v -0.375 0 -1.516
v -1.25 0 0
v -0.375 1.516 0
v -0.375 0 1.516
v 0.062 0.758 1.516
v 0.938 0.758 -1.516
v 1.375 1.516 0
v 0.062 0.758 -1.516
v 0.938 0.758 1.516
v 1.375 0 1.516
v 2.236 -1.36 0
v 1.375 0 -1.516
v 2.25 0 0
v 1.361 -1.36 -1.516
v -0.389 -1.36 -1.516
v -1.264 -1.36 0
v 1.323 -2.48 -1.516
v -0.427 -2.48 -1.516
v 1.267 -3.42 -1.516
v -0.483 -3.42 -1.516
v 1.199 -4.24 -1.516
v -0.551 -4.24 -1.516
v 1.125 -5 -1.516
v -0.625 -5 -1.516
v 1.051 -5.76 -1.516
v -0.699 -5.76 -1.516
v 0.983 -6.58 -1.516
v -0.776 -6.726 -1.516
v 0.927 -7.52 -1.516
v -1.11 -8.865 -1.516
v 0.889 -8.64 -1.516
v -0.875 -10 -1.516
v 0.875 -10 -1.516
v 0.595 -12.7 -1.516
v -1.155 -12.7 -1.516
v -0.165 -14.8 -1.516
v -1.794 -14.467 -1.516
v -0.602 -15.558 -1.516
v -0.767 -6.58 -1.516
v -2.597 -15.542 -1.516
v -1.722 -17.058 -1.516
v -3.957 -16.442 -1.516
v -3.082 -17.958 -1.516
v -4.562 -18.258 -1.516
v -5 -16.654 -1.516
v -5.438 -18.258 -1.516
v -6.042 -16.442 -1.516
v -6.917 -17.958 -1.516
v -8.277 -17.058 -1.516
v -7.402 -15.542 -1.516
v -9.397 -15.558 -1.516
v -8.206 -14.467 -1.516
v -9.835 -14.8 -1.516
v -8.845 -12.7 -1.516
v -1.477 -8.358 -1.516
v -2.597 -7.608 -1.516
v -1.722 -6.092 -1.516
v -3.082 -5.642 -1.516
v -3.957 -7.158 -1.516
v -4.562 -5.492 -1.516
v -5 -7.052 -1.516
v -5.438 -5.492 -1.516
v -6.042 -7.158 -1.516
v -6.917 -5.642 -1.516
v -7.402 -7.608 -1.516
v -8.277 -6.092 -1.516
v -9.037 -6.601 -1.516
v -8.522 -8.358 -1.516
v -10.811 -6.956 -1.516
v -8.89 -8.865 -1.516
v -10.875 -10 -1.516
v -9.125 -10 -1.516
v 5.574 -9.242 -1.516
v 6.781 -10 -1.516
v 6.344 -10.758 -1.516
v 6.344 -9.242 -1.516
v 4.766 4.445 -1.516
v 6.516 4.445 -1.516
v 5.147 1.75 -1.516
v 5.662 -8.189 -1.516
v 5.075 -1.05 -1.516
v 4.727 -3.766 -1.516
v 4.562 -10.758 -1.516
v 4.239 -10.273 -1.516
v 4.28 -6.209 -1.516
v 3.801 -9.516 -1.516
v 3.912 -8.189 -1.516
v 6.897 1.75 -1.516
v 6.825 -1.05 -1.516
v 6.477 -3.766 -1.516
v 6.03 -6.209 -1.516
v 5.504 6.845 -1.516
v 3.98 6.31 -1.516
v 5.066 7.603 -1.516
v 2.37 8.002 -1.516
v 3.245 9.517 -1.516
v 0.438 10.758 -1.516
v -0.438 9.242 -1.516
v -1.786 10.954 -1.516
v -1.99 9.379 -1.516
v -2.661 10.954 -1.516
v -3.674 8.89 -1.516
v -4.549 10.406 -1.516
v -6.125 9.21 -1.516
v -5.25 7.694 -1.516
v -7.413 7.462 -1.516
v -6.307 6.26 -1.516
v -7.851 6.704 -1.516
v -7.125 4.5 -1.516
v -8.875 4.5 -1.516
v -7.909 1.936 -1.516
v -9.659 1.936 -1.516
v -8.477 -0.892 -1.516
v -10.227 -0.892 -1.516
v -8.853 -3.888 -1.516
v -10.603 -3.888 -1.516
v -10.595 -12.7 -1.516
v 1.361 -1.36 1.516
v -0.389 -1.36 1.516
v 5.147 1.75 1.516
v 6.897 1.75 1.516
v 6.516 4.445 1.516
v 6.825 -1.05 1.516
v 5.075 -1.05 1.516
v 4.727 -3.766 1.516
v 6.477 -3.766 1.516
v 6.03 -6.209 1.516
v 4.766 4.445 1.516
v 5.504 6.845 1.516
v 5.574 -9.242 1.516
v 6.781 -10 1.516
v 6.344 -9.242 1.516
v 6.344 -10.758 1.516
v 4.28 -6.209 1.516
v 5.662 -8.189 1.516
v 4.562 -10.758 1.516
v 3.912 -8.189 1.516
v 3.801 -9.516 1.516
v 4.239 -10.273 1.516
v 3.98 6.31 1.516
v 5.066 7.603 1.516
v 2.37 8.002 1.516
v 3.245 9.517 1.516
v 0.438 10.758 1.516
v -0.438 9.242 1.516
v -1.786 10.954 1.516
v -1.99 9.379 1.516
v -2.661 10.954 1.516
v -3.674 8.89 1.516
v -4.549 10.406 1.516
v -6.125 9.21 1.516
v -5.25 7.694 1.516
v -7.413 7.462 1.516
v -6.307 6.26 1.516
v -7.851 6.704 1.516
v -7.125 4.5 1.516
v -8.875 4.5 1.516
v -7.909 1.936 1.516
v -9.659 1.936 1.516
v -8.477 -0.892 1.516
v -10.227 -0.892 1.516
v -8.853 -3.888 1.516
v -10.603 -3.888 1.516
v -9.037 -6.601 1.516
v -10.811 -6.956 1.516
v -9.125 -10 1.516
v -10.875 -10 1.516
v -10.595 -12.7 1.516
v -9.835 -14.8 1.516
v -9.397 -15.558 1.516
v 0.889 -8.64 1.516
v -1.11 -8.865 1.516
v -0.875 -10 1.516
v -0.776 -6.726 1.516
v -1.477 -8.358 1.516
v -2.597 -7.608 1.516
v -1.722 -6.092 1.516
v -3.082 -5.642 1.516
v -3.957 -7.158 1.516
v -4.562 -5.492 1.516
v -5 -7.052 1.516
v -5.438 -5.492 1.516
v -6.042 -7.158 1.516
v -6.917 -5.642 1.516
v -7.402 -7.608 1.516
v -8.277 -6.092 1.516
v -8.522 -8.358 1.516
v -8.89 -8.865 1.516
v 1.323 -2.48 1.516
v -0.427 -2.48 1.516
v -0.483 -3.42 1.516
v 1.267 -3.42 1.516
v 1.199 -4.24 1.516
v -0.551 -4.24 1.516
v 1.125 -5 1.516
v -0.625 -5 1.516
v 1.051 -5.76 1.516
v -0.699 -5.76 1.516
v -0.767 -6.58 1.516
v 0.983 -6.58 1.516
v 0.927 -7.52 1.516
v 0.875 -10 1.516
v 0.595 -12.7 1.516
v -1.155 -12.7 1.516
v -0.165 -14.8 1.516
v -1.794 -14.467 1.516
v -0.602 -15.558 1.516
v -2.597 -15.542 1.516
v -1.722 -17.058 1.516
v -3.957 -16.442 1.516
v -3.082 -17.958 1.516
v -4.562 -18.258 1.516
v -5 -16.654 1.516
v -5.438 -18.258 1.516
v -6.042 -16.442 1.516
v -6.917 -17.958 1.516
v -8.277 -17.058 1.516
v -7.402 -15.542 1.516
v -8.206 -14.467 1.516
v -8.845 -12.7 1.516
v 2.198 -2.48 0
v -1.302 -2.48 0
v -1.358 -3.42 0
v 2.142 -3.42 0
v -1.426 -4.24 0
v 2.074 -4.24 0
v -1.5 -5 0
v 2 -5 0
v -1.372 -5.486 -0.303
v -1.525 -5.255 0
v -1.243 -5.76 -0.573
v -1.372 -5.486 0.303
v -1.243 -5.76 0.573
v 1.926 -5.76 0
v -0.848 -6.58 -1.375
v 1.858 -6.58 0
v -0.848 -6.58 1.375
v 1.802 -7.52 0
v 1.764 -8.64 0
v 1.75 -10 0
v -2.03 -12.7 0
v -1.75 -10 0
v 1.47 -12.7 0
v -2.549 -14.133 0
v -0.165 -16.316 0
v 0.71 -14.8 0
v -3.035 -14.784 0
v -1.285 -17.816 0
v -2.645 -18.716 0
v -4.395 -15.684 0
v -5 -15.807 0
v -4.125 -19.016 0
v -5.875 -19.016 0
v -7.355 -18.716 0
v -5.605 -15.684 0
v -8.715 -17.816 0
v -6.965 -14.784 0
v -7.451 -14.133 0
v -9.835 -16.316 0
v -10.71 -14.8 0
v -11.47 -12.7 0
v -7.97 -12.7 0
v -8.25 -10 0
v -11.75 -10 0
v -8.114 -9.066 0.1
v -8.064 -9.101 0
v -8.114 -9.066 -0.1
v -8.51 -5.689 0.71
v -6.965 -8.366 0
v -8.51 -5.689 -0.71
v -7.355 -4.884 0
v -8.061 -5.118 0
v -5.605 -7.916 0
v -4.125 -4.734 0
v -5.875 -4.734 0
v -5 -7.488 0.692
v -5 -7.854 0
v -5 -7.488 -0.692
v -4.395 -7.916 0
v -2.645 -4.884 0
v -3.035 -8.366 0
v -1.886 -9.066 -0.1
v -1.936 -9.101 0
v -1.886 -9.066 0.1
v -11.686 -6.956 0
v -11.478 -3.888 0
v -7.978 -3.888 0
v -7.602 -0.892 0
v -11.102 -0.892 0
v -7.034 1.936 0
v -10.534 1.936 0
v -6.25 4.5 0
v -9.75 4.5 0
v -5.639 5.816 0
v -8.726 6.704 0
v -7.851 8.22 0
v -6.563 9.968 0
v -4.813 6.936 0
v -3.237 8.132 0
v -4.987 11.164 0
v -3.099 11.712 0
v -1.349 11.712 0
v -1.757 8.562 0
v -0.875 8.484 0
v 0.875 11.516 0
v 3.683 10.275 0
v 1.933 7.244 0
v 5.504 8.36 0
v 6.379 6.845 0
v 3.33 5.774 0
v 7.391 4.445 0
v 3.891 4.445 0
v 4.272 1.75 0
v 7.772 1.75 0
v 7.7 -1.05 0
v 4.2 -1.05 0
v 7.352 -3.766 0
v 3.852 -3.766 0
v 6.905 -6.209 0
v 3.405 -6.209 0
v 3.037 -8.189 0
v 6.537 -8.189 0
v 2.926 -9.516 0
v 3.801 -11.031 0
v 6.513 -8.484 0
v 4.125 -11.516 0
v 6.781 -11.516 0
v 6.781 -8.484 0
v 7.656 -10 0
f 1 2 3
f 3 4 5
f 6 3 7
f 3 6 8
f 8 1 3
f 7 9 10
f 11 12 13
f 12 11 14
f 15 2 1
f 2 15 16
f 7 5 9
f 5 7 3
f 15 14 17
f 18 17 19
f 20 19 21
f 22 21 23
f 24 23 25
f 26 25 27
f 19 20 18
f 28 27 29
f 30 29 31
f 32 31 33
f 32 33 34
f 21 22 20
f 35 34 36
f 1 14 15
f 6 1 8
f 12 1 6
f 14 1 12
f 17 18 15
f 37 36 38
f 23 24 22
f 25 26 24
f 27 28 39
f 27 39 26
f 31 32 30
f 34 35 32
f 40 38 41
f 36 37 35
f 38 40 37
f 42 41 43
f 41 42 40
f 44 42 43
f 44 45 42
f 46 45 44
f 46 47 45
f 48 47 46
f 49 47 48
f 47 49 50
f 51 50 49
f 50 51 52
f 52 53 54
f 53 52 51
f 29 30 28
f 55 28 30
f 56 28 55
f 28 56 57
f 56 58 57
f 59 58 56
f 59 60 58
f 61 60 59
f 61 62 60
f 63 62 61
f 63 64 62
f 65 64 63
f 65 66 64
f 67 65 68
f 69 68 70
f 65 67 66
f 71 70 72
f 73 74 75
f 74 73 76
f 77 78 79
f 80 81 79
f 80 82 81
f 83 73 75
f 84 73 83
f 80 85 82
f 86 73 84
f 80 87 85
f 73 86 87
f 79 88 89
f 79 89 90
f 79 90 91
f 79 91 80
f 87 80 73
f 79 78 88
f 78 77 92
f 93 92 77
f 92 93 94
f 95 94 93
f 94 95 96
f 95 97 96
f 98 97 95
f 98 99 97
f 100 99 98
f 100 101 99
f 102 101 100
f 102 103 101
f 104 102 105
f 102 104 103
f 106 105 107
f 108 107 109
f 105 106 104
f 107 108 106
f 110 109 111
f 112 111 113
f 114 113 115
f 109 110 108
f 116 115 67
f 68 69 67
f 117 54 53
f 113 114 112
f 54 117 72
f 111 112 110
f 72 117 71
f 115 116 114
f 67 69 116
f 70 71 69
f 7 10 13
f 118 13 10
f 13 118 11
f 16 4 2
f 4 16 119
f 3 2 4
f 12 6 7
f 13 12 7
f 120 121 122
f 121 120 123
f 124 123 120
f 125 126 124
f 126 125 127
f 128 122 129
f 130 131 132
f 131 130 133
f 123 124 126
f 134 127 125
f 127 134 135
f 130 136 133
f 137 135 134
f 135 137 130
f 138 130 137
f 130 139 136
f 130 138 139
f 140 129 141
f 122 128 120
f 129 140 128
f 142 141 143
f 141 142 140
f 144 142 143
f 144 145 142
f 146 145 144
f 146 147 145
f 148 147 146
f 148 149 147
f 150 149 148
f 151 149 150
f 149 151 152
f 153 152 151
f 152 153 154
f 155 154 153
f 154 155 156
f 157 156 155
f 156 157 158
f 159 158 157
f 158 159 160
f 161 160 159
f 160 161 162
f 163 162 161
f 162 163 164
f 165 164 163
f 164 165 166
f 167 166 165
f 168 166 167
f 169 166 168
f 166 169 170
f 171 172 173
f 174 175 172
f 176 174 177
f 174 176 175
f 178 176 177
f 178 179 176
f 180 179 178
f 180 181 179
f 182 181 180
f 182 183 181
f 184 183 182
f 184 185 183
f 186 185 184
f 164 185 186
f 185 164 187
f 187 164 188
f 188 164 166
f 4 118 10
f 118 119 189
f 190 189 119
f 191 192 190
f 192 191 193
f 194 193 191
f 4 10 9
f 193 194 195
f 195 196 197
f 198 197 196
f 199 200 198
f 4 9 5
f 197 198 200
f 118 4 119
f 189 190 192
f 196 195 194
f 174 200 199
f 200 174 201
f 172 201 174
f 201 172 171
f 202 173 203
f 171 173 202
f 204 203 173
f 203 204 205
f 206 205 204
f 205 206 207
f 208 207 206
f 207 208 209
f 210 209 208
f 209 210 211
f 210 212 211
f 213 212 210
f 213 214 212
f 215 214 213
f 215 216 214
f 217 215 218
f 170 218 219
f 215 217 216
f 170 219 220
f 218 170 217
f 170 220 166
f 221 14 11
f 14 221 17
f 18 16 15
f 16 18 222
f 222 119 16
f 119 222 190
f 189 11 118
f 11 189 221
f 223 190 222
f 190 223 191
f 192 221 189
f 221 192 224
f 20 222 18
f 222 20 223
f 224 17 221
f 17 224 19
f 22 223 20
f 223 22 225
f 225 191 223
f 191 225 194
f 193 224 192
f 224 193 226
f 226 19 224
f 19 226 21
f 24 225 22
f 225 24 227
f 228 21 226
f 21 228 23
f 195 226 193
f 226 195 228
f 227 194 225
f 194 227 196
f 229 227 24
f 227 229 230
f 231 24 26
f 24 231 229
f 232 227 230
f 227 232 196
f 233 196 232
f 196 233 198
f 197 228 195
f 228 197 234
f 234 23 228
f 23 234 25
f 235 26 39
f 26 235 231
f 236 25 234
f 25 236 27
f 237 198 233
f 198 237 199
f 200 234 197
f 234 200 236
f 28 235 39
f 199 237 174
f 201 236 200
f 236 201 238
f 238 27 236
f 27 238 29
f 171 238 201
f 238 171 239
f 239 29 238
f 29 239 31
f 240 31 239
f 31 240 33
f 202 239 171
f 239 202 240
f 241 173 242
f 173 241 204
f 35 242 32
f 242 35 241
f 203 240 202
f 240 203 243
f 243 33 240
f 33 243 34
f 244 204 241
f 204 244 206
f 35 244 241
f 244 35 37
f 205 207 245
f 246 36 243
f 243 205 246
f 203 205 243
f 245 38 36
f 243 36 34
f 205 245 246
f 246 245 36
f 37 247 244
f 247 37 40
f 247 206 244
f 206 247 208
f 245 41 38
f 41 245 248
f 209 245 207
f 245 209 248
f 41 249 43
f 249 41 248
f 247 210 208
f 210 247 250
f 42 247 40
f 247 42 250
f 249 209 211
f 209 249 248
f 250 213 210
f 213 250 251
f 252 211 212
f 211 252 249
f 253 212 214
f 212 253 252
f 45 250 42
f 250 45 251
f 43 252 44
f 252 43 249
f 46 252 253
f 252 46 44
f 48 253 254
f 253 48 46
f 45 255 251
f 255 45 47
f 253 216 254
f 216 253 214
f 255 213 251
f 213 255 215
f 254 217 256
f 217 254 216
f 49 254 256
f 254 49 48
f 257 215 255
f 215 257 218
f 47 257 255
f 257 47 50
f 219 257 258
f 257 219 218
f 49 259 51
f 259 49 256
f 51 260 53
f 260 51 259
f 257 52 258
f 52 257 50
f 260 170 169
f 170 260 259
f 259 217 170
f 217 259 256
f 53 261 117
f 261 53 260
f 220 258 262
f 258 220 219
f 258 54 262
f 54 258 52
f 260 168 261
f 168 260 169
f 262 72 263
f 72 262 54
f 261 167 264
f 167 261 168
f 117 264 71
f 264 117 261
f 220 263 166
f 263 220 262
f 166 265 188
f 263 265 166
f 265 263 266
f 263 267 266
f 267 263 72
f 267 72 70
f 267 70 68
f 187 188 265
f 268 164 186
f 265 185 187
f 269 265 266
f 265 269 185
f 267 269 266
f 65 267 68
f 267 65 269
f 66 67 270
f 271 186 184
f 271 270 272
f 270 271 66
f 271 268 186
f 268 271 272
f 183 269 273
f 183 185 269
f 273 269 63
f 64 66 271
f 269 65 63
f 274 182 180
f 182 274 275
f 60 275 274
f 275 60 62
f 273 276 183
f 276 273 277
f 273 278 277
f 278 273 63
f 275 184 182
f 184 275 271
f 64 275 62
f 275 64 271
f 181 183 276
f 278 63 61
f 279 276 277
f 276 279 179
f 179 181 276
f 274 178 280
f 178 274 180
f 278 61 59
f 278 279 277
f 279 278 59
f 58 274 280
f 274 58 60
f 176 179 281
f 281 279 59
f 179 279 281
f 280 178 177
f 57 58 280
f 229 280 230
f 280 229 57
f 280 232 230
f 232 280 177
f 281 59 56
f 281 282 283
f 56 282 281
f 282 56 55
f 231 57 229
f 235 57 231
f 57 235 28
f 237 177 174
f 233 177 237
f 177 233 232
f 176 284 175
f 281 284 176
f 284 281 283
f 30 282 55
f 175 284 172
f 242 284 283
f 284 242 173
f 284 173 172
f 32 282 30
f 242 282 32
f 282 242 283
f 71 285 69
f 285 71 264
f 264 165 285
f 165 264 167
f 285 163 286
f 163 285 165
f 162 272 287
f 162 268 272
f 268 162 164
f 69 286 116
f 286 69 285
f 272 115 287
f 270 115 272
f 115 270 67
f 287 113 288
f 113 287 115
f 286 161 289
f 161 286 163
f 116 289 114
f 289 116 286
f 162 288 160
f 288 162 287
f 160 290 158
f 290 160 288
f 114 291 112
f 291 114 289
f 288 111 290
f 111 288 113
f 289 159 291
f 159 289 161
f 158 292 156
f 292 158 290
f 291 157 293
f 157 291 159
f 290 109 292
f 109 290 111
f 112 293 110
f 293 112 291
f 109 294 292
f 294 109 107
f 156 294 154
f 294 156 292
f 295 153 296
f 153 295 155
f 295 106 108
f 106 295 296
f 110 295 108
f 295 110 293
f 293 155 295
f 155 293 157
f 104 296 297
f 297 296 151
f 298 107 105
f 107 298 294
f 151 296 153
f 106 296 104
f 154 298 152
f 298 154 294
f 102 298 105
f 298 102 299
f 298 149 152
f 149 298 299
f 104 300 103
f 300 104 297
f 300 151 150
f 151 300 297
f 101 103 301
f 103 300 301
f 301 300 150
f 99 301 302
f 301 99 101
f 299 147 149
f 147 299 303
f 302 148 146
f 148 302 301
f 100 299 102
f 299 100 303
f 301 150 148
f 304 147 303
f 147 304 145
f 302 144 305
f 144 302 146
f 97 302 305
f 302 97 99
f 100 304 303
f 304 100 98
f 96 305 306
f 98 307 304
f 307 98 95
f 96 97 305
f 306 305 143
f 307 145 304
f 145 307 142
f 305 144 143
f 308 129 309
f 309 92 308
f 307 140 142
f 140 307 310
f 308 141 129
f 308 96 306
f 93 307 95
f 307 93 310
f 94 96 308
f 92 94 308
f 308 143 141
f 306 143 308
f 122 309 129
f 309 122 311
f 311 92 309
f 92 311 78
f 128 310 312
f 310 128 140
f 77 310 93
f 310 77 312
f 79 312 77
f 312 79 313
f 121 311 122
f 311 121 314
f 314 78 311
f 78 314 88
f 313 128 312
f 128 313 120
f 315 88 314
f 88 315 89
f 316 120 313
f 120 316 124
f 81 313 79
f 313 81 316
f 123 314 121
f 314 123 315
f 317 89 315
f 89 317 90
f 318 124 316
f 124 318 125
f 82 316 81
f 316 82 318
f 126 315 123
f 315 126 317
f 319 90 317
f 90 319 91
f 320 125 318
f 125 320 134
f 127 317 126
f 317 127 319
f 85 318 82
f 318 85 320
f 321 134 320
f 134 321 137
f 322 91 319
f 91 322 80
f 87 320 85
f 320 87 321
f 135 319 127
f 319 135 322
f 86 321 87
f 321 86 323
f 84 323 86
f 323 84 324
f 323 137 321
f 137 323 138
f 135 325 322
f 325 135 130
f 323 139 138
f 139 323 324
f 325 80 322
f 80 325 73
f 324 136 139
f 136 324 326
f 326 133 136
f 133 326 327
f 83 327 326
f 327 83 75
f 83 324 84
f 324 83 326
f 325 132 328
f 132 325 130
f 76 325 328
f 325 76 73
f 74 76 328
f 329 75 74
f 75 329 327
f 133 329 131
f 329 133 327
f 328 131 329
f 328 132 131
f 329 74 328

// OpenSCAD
// file: ribbon.scad
module ribbon(points, thickness=1, closed=false) {
    p = closed ? concat(points, [points[0]]) : points;
    
    union() {
        for (i=[1:len(p)-1]) {
            hull() {
                translate(p[i-1]) 
                    if ($children==0)
                        circle(d=thickness, $fn=8);
                    else
                        children();
                translate(p[i]) 
                    if ($children==0)
                        circle(d=thickness, $fn=8);
                    else
                        children();
            }
        }
    }
}

pi = 3.1415926535897932;
function SIN(theta) = sin(theta * 180 / pi);
function COS(theta) = cos(theta * 180 / pi);
function TAN(theta) = tan(theta * 180 / pi);

//<skip>
color("red") linear_extrude(height=10)
 ribbon([for (theta=[0:0.1:2*pi]) [theta * 10 / (2*pi), SIN(theta) * 10 / (2*pi)]], thickness=3, height=10, closed=true);
color("blue") linear_extrude(height=10)
 ribbon([for (theta=[0:0.1:2*pi]) [theta * 10 / (2*pi), SIN(theta) * 10 / (2*pi)]], thickness=.1, height=10, closed=true);
ribbon([for (theta=[0:0.1:2*pi+.1]) [COS(theta)*10, SIN(3*theta) * 10]], thickness=.5);
//</skip>
    
// file: bezier.scad
/* 
Copyright (c) 2017 Alexander R. Pruss.

Licensed under any Creative Commons Attribution license you like or under the 
following MIT License.

Permission is hereby granted, free of charge, to any person obtaining a copy
of this software and associated documentation files (the "Software"), to deal
in the Software without restriction, including without limitation the rights
to use, copy, modify, merge, publish, distribute, sublicense, and/or sell
copies of the Software, and to permit persons to whom the Software is
furnished to do so, subject to the following conditions:

The above copyright notice and this permission notice shall be included in all
copies or substantial portions of the Software.

THE SOFTWARE IS PROVIDED "AS IS", WITHOUT WARRANTY OF ANY KIND, EXPRESS OR
IMPLIED, INCLUDING BUT NOT LIMITED TO THE WARRANTIES OF MERCHANTABILITY,
FITNESS FOR A PARTICULAR PURPOSE AND NONINFRINGEMENT. IN NO EVENT SHALL THE
AUTHORS OR COPYRIGHT HOLDERS BE LIABLE FOR ANY CLAIM, DAMAGES OR OTHER
LIABILITY, WHETHER IN AN ACTION OF CONTRACT, TORT OR OTHERWISE, ARISING FROM,
OUT OF OR IN CONNECTION WITH THE SOFTWARE OR THE USE OR OTHER DEALINGS IN THE
SOFTWARE. 

*/


// Public domain Bezier stuff from www.thingiverse.com/thing:8443
function BEZ03(u) = pow((1-u), 3);
function BEZ13(u) = 3*u*(pow((1-u),2));
function BEZ23(u) = 3*(pow(u,2))*(1-u);
function BEZ33(u) = pow(u,3);
function PointAlongBez4(p0, p1, p2, p3, u) = [
	BEZ03(u)*p0[0]+BEZ13(u)*p1[0]+BEZ23(u)*p2[0]+BEZ33(u)*p3[0],
	BEZ03(u)*p0[1]+BEZ13(u)*p1[1]+BEZ23(u)*p2[1]+BEZ33(u)*p3[1]];
// End public domain Bezier stuff

function SMOOTH_REL(x) = ["r",x];
function SMOOTH_ABS(x) = ["a",x];
function SYMMETRIC() = ["r",1];
function OFFSET(v) = ["o",v];
function SHARP() = OFFSET([0,0]);
function POLAR(r,angle) = OFFSET(r*[cos(angle),sin(angle)]);
function POINT_IS_SPECIAL(v) = (v[0]=="r" || v[0]=="a" || v[0]=="o");

function normalize2D(v) = v / sqrt(v[0]*v[0]+v[1]*v[1]);

// this does NOT handle offset type points; to handle those, use DecodeBezierOffsets()
function getControlPoint(cp,node,otherCP) = cp[0]=="r"?(node+cp[1]*(node-otherCP)):( cp[0]=="a"?node+cp[1]*normalize2D(node-otherCP):cp );

function Bezier2(p,index=0,precision=0.05,rightEndPoint=true) = let(nPoints=ceil(1/precision)) [for (i=[0:nPoints-(rightEndPoint?0:1)]) PointAlongBez4(p[index+0],p[index+1],p[index+2],p[index+3],i/nPoints)];
    
function flatten(listOfLists) = [ for(list = listOfLists) for(item = list) item ];


// p is a list of points, in the format:
// [node1,control1,control2,node2,control3, control4,node3, ...]
// You can replace inner control points with:
//   SYMMETRIC: uses a reflection of the control point on the other side of the node
//   SMOOTH_REL(x): like SYMMETRIC, but the distance of the control point to the node is x times the distance of the other control point to the node
//   SMOOTH_ABS(x): like SYMMETRIC, but the distance of the control point to the node is exactly x
// You can also replace any control point with:
//   OFFSET(v): puts the control point at the corresponding node plus the vector v
//   SHARP(): equivalent to OFFSET([0,0]); useful for straight lines
//   POLAR(r,angle): like OFFSET, except the offset is specified in polar coordinates

function DecodeBezierOffset(control,node) = control[0] == "o" ? node+control[1] : control;

// replace all OFFSET/SHARP/POLAR points with coordinates
function DecodeBezierOffsets(p) = [for (i=[0:len(p)-1]) i%3==0?p[i]:(i%3==1?DecodeBezierOffset(p[i],p[i-1]):DecodeBezierOffset(p[i],p[i+1]))];

function DecodeSpecialBezierPoints(p0) = let(p=DecodeBezierOffsets(p0)) [for (i=[0:len(p)-1]) i%3==0?p[i]:(i%3==1?getControlPoint(p[i],p[i-1],p[i-2]):getControlPoint(p[i],p[i+1],p[i+2]))];

function Distance2D(a,b) = sqrt((a[0]-b[0])*(a[0]-b[0])+(a[1]-b[1])*(a[1]-b[1]));

function RemoveDuplicates(p,eps=0.00001) = let(safeEps = eps/len(p)) [for (i=[0:len(p)-1]) if(i==0 || i==len(p)-1 || Distance2D(p[i-1],p[i]) >= safeEps) p[i]];

function Bezier(p,precision=0.05,eps=0.00001) = let(q=DecodeSpecialBezierPoints(p), nodes=(len(p)-1)/3) RemoveDuplicates(flatten([for (i=[0:nodes-1]) Bezier2(q,index=i*3,precision=precision,rightEndPoint=(i==nodes-1))]),eps=eps);
    
module BezierVisualize(p,precision=0.05,eps=0.00001,lineThickness=0.25,controlLineThickness=0.125,nodeSize=1) {
    $fn = 16;
    p1 = DecodeSpecialBezierPoints(p);
    l = Bezier(p1,precision=precision,eps=eps);
    for (i=[0:len(l)-2]) {
        hull() {
            translate(l[i]) circle(d=lineThickness);
            translate(l[i+1]) circle(d=lineThickness);
        }
    }
    for (i=[0:len(p1)-1]) {
        if (i%3 == 0) {
            color("black") translate(p1[i]) circle(d=nodeSize);
        }
        else {
            node = i%3 == 1 ? i-1 : i+1;
            color("red") translate(p1[i]) circle(d=nodeSize);
            color("red") hull() {
                translate(p1[node]) circle(d=controlLineThickness);
                translate(p1[i]) circle(d=controlLineThickness);
            }
        }
    }
}

//<skip>
translate([0,-15]) BezierVisualize([[0,0],/*C*/[5,0],/*C*/SYMMETRIC(),[10,10],/*C*/[15,10],/*C*/OFFSET([-5,0]),[20,0]]);
linear_extrude(height=5) {
polygon(Bezier([[0,0],/*C*/[5,0],/*C*/SYMMETRIC(),[10,10],/*C*/[15,10],/*C*/OFFSET([-5,0]),[20,0]],precision=0.05));
translate([0,15])
polygon(Bezier([[0,0],/*C*/[5,0],/*C*/SMOOTH_REL(2),[10,10],/*C*/[15,10],/*C*/POLAR(5,180),[20,0]],precision=0.05));
translate([0,30])
polygon(Bezier([[0,0],/*C*/[5,0],/*C*/SMOOTH_ABS(1.5),[10,10],/*C*/[15,10],/*C*/OFFSET([-5,0]),[20,0]],precision=0.05));
translate([0,45])
polygon(Bezier([[0,0],/*C*/[5,0],/*C*/SMOOTH_REL(-1),[10,10],/*C*/[15,10],/*C*/OFFSET([-5,0]),[20,0]],precision=0.05));
translate([0,60])
polygon(Bezier([[0,0],/*C*/[5,0],/*C*/SMOOTH_ABS(-1),[10,10],/*C*/[15,10],/*C*/OFFSET([-5,0]),[20,0]],precision=0.05));
translate([0,75])
polygon(Bezier([[0,0],/*C*/SHARP(),/*C*/SHARP(),[10,10],/*C*/SHARP(),/*C*/OFFSET([-5,0]),[20,0]],precision=0.05));
}
//</skip>
// main file
use <bezier.scad>;
use <ribbon.scad>;

//<params>
curve = [ [0.5,0], OFFSET([0,-5]), OFFSET([0,5]), 
          [0,-10], OFFSET([0,-10]), OFFSET([0,-10]), 
          [-10,-10], OFFSET([0,5]), OFFSET([0,5]), 
          [0,-10], OFFSET([0,5]), OFFSET([0,5]), 
          [-10,-10], OFFSET([0,10]), OFFSET([-8,2]),
          [0,10], SMOOTH_REL(1.4), OFFSET([-2,0]), 
          [5,-10], SYMMETRIC(), OFFSET([-.1,0]), [5.2,-10]
          
        ];  
//</params>

//BezierVisualize(curve, lineThickness=0.1, precision=0.1);
ribbon(Bezier(curve, precision=0.1)) sphere(d=3.5, $fn=6);
